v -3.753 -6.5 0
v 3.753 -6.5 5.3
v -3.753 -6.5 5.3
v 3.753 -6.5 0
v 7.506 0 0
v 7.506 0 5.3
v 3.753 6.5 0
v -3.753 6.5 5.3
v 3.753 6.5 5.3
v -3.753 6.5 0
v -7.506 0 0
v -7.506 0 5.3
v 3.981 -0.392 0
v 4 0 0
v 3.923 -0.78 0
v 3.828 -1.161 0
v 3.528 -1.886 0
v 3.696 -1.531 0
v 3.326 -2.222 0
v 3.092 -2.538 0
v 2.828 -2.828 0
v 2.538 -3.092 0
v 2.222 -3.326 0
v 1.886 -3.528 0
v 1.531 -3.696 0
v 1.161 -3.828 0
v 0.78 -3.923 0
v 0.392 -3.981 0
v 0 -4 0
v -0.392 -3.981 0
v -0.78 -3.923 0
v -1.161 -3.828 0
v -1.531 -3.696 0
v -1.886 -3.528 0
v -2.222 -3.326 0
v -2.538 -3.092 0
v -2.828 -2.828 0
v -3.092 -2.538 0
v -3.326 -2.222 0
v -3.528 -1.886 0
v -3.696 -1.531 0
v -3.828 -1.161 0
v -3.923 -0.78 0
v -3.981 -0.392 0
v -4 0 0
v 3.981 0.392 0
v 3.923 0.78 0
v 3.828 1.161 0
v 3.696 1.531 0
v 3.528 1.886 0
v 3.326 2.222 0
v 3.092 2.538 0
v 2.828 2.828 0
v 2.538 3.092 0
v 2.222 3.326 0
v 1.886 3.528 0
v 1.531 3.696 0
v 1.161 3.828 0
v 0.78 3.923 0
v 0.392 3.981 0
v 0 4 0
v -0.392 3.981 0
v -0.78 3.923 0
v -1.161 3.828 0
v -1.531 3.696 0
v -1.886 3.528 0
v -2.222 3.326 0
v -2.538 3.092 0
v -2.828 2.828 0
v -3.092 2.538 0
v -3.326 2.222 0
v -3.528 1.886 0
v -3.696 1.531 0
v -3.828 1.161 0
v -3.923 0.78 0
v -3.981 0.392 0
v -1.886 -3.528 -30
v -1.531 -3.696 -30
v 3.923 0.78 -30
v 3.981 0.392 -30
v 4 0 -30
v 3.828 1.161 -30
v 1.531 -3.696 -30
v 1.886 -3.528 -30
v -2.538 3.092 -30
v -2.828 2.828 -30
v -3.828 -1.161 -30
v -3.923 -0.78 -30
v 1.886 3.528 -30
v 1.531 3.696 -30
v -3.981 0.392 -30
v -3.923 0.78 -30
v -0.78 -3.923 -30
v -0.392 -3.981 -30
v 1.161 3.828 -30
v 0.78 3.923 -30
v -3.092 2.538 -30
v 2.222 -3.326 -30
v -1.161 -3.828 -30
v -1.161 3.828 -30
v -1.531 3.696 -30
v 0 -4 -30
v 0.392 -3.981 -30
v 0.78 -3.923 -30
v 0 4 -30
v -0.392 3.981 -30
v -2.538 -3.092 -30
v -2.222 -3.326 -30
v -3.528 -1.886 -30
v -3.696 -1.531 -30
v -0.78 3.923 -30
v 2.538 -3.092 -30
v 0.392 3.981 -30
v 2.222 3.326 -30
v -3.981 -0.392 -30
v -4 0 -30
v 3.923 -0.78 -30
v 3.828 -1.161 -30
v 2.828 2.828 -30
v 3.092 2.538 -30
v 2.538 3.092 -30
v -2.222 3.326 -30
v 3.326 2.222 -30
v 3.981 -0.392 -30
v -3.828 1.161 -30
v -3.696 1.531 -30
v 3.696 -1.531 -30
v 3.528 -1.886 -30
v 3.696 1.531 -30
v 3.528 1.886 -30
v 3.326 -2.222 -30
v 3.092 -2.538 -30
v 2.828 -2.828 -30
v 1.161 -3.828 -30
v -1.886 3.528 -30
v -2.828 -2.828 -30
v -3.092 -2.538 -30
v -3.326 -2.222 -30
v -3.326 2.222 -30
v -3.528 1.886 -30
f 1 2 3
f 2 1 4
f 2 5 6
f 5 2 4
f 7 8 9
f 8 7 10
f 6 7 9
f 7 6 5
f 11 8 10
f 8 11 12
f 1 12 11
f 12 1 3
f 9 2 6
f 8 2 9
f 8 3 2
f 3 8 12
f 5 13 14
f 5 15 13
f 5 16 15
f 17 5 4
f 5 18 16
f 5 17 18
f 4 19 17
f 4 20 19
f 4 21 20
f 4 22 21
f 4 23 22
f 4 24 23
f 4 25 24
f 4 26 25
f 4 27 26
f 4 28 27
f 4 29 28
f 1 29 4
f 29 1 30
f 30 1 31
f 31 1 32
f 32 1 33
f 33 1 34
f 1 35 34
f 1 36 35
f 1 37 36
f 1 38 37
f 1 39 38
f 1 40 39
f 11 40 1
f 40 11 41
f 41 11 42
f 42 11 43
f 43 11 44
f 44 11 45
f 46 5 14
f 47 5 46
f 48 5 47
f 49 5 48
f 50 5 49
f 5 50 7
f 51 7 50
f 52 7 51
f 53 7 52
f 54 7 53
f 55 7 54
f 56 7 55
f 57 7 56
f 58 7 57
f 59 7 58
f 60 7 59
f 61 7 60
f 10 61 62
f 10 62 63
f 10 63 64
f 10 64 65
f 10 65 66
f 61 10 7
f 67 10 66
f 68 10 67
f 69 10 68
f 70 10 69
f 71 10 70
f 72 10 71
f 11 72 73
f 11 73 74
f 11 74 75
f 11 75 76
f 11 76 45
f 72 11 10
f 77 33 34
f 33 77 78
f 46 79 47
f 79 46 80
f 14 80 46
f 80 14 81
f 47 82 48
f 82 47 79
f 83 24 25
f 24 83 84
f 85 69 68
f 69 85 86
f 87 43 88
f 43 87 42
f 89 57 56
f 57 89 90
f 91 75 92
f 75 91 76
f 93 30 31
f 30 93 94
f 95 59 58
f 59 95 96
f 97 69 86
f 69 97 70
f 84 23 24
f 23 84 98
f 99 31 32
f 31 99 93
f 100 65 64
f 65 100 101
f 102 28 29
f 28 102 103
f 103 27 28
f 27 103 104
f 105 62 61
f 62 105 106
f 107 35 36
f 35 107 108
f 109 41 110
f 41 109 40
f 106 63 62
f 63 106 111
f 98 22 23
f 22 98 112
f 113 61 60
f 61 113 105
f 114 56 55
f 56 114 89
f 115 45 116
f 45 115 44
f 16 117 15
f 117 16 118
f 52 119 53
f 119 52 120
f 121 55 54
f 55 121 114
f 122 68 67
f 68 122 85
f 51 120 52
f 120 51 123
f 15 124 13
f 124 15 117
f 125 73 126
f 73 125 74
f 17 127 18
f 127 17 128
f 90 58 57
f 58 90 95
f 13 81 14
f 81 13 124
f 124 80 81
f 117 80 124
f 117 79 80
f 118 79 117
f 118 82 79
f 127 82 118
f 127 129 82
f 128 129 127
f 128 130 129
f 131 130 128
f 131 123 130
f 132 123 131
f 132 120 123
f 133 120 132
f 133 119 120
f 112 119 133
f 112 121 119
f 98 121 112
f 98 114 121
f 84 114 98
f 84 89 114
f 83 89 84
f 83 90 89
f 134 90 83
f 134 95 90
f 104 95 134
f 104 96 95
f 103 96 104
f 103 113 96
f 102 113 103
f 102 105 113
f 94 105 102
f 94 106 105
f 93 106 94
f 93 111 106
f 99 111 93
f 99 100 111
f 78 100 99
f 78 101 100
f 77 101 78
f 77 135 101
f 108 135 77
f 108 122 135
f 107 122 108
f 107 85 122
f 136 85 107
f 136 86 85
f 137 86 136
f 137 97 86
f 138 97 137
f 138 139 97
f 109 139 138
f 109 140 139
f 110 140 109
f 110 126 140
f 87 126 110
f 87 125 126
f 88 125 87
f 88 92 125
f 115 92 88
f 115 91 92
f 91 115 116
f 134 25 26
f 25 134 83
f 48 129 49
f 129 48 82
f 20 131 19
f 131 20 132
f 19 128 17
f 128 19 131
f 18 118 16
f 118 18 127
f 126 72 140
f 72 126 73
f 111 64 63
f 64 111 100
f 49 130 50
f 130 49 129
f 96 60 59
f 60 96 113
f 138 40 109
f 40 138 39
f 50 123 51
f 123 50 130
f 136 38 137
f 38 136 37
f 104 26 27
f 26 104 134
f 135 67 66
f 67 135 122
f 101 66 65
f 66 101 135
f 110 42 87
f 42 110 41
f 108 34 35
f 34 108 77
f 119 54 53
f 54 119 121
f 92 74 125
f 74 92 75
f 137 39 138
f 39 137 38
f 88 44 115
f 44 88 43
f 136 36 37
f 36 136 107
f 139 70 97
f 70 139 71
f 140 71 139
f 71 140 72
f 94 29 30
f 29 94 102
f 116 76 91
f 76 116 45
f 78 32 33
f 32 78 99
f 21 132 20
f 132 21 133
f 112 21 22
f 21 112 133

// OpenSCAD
$fn = 64;

// Head
translate([0, 0, 5.3/2])
    cylinder(h = 5.3, r = 13 / 2 / cos(30), $fn = 6, center = true);

// Shank
translate([0, 0, -30/2])
    cylinder(h = 30, d = 8, center = true);
